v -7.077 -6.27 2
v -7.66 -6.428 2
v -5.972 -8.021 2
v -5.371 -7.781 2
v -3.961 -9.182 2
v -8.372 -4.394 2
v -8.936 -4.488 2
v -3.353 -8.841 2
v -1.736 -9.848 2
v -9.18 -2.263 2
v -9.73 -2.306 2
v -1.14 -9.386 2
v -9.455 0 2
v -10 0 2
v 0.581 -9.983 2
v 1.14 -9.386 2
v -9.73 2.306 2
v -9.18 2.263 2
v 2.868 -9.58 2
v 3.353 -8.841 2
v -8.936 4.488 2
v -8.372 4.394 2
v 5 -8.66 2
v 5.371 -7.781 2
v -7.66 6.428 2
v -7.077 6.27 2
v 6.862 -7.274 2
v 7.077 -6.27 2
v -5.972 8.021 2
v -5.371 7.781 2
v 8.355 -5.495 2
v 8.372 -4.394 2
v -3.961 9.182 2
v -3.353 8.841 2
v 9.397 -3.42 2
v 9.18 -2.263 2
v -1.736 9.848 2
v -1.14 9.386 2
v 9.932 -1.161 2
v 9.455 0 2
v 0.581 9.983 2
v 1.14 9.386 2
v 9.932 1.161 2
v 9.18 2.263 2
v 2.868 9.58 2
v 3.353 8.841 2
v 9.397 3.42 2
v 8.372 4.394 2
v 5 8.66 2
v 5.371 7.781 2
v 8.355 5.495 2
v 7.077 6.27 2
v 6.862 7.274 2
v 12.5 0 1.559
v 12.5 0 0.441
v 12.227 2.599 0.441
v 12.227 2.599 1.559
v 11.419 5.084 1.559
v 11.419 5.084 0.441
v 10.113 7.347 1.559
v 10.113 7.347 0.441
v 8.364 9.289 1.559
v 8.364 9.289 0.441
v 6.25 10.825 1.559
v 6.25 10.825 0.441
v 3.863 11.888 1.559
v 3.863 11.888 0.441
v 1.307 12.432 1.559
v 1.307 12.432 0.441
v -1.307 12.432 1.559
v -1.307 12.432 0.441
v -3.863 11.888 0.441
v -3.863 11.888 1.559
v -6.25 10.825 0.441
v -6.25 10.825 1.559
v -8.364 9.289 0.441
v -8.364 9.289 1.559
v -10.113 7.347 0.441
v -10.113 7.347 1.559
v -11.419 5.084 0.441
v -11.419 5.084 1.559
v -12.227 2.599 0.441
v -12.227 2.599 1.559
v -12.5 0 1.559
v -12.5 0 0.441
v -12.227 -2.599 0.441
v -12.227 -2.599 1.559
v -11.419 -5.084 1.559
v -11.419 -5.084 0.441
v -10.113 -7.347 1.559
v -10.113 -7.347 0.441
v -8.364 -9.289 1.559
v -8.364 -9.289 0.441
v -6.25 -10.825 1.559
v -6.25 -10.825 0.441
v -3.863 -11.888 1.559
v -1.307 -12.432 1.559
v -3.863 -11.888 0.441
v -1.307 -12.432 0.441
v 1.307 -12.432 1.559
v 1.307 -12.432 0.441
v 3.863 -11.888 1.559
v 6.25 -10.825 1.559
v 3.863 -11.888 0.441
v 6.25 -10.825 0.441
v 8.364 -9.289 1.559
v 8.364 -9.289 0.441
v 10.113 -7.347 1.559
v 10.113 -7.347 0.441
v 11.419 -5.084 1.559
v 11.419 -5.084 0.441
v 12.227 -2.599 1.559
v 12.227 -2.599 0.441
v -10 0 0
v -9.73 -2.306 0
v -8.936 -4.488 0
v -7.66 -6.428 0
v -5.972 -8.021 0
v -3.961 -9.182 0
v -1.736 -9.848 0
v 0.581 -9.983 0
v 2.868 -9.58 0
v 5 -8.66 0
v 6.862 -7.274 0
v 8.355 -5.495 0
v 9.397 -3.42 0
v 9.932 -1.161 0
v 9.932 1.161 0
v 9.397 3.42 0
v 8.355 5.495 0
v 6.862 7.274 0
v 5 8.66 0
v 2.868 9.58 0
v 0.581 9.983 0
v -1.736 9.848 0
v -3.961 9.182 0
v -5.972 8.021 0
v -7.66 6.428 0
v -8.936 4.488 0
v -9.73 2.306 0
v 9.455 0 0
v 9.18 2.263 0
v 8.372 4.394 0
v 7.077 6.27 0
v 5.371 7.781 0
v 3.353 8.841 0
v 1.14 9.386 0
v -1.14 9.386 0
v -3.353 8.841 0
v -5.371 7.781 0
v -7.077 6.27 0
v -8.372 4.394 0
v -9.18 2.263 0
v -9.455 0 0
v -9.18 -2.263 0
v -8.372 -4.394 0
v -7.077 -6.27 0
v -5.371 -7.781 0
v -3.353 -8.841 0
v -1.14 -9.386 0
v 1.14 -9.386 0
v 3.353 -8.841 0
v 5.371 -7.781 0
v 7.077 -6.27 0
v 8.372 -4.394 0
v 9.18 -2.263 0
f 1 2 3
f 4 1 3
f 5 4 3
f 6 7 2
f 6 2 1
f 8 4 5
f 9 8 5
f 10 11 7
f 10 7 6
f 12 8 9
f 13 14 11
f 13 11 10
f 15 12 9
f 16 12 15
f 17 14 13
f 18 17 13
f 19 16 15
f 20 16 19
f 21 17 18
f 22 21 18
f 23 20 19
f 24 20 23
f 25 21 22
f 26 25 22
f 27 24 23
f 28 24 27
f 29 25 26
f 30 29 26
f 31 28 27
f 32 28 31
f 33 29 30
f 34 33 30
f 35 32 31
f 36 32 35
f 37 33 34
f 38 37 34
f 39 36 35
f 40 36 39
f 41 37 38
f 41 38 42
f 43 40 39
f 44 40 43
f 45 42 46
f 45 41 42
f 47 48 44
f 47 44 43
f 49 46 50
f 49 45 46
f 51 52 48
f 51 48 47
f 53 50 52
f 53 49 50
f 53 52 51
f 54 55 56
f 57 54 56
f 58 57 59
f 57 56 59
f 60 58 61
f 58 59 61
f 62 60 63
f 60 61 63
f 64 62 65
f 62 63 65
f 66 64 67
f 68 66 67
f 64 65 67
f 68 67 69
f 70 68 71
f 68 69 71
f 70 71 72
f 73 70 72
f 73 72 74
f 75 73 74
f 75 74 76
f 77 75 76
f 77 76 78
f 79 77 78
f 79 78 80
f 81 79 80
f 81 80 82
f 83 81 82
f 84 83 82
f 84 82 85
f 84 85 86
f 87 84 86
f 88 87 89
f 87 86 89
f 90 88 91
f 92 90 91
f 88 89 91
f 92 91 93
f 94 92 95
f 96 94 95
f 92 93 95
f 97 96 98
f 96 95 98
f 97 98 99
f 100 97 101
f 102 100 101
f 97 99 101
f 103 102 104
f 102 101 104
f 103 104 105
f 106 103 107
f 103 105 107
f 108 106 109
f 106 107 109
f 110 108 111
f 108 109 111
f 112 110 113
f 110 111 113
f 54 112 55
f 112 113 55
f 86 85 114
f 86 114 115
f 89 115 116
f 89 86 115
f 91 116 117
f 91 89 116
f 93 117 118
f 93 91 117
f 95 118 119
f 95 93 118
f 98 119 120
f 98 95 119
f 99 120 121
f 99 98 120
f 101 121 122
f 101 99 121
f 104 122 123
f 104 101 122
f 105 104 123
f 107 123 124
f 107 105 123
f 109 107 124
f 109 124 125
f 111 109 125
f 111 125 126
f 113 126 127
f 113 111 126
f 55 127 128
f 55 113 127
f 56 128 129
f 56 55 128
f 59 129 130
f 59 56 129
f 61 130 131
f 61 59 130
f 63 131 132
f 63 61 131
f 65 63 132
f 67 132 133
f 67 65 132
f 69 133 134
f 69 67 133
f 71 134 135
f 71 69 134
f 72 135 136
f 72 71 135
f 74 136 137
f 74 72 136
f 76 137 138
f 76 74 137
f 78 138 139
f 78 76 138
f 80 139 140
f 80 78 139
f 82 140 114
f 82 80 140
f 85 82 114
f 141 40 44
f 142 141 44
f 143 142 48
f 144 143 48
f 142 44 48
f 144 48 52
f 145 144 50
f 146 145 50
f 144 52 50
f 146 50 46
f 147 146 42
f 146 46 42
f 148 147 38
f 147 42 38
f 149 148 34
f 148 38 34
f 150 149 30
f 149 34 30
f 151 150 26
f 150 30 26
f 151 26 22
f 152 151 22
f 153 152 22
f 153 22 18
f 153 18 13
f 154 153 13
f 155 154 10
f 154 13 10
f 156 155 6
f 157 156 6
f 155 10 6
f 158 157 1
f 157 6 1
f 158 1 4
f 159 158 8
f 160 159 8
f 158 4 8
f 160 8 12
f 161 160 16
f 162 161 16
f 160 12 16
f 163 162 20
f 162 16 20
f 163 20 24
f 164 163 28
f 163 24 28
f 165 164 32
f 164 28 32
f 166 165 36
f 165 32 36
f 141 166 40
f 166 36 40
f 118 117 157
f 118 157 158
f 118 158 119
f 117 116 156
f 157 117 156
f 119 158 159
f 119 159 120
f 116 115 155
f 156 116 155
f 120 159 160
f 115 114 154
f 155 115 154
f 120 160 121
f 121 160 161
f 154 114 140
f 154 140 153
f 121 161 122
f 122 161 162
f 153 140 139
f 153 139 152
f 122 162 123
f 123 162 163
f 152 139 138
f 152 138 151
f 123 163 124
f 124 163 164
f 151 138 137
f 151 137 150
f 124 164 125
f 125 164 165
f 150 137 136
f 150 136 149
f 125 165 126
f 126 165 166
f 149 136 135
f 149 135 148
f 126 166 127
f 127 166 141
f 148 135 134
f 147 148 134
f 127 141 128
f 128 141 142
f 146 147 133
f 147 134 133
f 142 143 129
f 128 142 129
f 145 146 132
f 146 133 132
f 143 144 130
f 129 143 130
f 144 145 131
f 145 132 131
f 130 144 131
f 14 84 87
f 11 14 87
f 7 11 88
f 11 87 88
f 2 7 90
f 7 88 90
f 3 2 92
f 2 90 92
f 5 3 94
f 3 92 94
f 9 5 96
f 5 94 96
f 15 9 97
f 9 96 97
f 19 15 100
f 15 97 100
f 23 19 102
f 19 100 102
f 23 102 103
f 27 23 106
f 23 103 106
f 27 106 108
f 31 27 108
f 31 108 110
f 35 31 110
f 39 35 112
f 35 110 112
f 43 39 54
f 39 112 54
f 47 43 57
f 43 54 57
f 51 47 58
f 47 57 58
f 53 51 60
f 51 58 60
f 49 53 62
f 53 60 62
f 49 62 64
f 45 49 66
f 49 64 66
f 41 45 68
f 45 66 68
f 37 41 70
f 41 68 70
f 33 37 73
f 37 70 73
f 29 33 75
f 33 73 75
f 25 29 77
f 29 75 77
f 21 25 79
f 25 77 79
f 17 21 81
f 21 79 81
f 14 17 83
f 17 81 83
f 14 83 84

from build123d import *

# Parameters (mm, degrees)
SKETCH1_R           = 12.5
BOSS_EXTRUDE1_DEPTH = 2
SKETCH2_R           = 9.455
CUT_EXTRUDE1_DEPTH  = 2


with BuildPart() as part:
    # Sketch1 → Boss-Extrude1 (new body)
    with BuildSketch(Plane.XY):
        Circle(SKETCH1_R)
    extrude(amount=BOSS_EXTRUDE1_DEPTH)

    # Sketch2 → Cut-Extrude1 (cut)
    with BuildSketch(Plane.XY.offset(2)):
        Circle(SKETCH2_R)
    extrude(amount=-CUT_EXTRUDE1_DEPTH, mode=Mode.SUBTRACT)

    # Sketch3 → Cut-Revolve1 (revolve, cut)
    with BuildSketch(Plane(origin=(0, 0, 0), x_dir=(0, 0, -1), z_dir=(1, 0, 0)), mode=Mode.PRIVATE) as cut_revolve1_sk:
        Polygon((-2, 10), (-1.559182548, 12.5), (-2, 12.5), align=None)
        Polygon((-0.440817452, 12.5), (0, 12.5), (0, 10), align=None)
    revolve(cut_revolve1_sk.sketch.rotate(Axis((0, 0, -0.1), (0, 0, 1)), 90), axis=Axis((0, 0, -0.1), (0, 0, 1)), mode=Mode.SUBTRACT)


solid = part.part
